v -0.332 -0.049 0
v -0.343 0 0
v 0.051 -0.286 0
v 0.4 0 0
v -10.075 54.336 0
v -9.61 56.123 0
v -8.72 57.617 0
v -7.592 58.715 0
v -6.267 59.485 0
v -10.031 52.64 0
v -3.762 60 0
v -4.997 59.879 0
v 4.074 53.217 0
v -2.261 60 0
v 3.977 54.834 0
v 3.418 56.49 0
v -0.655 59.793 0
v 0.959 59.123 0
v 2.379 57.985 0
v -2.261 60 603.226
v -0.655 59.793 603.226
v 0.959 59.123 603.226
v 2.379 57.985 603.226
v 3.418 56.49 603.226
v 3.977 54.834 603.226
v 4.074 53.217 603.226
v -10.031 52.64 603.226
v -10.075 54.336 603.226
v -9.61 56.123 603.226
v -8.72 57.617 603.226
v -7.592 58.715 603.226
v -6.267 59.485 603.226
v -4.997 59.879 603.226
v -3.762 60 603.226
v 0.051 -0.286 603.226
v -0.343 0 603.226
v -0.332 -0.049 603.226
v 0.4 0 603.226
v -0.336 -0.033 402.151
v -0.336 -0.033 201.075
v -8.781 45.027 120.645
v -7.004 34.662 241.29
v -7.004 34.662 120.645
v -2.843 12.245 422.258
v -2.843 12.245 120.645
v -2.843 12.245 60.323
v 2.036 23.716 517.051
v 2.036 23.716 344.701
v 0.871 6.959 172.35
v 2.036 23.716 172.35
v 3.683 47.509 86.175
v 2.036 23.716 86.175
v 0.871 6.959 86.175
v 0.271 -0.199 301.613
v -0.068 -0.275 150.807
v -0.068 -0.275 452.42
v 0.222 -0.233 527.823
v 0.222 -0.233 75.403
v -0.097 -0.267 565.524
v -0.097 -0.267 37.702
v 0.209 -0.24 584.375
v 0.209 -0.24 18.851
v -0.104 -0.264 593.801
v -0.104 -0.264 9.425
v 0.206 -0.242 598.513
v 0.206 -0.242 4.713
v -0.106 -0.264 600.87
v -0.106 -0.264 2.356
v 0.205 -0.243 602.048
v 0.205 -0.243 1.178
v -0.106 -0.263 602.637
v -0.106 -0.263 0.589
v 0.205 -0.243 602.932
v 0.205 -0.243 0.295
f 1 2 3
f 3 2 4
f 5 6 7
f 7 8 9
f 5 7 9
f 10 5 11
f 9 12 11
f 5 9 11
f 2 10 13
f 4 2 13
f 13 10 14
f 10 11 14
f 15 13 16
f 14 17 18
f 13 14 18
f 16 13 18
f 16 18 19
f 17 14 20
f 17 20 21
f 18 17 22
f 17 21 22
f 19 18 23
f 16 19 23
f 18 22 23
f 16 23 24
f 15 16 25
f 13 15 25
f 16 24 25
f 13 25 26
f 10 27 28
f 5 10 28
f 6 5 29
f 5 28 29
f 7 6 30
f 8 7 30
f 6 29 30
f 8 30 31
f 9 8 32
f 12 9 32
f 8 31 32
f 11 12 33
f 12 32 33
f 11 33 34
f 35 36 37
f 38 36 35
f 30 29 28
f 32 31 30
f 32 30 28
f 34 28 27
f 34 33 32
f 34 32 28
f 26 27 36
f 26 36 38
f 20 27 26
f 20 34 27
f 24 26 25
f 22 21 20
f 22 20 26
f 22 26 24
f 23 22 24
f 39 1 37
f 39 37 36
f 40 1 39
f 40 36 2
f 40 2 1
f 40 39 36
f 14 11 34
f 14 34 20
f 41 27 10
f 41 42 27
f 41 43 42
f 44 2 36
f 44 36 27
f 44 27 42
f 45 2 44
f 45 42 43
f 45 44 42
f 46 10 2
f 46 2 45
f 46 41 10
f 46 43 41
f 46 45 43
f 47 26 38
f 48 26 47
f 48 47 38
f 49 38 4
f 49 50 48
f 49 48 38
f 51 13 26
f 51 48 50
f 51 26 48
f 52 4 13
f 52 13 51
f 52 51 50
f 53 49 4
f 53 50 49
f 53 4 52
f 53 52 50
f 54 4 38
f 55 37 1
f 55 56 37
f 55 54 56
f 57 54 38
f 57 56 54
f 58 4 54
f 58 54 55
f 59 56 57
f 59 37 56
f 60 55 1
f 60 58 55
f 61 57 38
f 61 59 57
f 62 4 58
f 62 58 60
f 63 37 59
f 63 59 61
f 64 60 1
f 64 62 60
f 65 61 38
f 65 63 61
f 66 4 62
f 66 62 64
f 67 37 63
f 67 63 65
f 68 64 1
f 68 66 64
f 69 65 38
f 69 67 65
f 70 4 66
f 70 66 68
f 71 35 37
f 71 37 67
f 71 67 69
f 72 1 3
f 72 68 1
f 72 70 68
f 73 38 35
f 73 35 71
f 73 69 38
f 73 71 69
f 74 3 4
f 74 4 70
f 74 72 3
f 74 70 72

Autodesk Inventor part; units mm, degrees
ref_plane "YZ Plane" through (0, 0, 0) normal (1, 0, 0) x (0, 1, 0)
ref_plane "XZ Plane" through (0, 0, 0) normal (0, 1, 0) x (-1, 0, 0)
ref_plane "Work Plane1" through (0, 0, 0) normal (0, 0, 1) x (1, 0, 0)
sketch "Sketch1" plane through (0, 0, 0) normal (0, 0, 1) x (1, 0, 0)
  spline S0 degree 3 poles (-0.3432, 0) (-0.5476, 0.9305) (-1.8109, 6.8833) (-4.6379, 21.5083) (-5.8348, 28.0065) (-7.2785, 36.223) (-7.5554, 37.8163) (-8.144, 41.2441) (-8.4751, 43.1968) (-9.6001, 49.9214) (-10.403, 54.896) (-11.194, 60) knots -7.723672 -7.723672 -7.723672 -7.723672 -4.852573 -4.852573 -2.692004 -2.692004 -2.185384 -2.185384 -1.605169 -1.605169 -0.053083 -0.053083 -0.053083 -0.053083 projected
  spline S1 degree 3 poles (-0.3324, -0.0487) (-0.3358, -0.0335) (-0.3394, -0.0172) (-0.3432, 0) knots -0.056243 -0.056243 -0.056243 -0.056243 -0.050014 -0.050014 -0.050014 -0.050014 projected
  spline S2 degree 3 poles (0.4003, 0) (0.3914, -0.0334) (0.3779, -0.0655) (0.3429, -0.1252) (0.3214, -0.1525) (0.2602, -0.2119) (0.2174, -0.2397) (0.1233, -0.2774) (0.0729, -0.2868) (-0.0285, -0.2859) (-0.0786, -0.2756) (-0.1717, -0.2365) (-0.214, -0.2081) (-0.285, -0.1369) (-0.3131, -0.0949) (-0.3324, -0.0487) knots -0.096513 -0.096513 -0.096513 -0.096513 -0.086135 -0.086135 -0.075744 -0.075744 -0.060566 -0.060566 -0.045346 -0.045346 -0.030151 -0.030151 -0.015033 -0.015033 0 0 0 0 projected
  spline S3 degree 3 poles (4.5352, 60) (4.1492, 54.3024) (3.8851, 50.4553) (3.5768, 45.9572) (3.4952, 44.7719) (3.3704, 42.9615) (3.3433, 42.5677) (2.8933, 36.0424) (2.4653, 29.8794) (1.9678, 22.7306) (1.9176, 22.0094) (1.5419, 16.6071) (1.2042, 11.7834) (0.7423, 5.1029) (0.4375, 0.6896) (0.4003, 0) knots -1.505674 -1.505674 -1.505674 -1.505674 -1.330011 -1.330011 -1.237485 -1.237485 -1.213768 -1.213768 -0.810155 -0.810155 -0.745592 -0.745592 -0.207193 -0.207193 0 0 0 0 projected
  line L0 (-11.194, 60) -> (4.5352, 60) projected
  point P0 (0, 0)
ref_plane "Work Plane2" through (-0.5511, 59.985, 603.2266) normal (-0.0007, 0, -1) x (-1, 0.0063, 0.0007)
sketch "Sketch2" plane through (-0.5511, 59.985, 603.2266) normal (-0.0007, 0, -1) x (-1, 0.0063, 0.0007)
  spline S0 degree 3 poles (10.5494, 0) (10.2293, -2.2481) (9.8995, -4.4964) (9.1887, -9.2246) (8.8031, -11.7217) (7.617, -19.2349) (6.7636, -24.413) (5.6798, -30.7739) (5.4357, -32.1924) (4.488, -37.646) (3.7345, -41.8662) (1.487, -53.9406) (0.6091, -57.9871) (0.1466, -60) knots -1.758139 -1.758139 -1.758139 -1.758139 -1.591949 -1.591949 -1.406575 -1.406575 -1.02993 -1.02993 -0.92277 -0.92277 -0.615604 -0.615604 -0.003901 -0.003901 -0.003901 -0.003901 projected
  line L0 (-4.5586, 0) -> (10.5494, 0) projected
  spline S1 degree 3 poles (-0.4384, -60) (-0.5115, -58.4166) (-0.6219, -56.3988) (-0.8889, -51.9428) (-1.0365, -49.6525) (-1.4591, -43.3117) (-1.7767, -38.8185) (-2.2573, -32.1106) (-2.4709, -29.16) (-2.7817, -24.8733) (-2.8913, -23.3626) (-3.3521, -17.0005) (-3.6389, -13.0261) (-3.987, -8.1315) (-4.0258, -7.5846) (-4.2301, -4.7006) (-4.3955, -2.346) (-4.5586, 0) knots -6.638256 -6.638256 -6.638256 -6.638256 -5.879486 -5.879486 -5.125599 -5.125599 -3.729436 -3.729436 -2.742881 -2.742881 -2.242014 -2.242014 -0.922307 -0.922307 -0.757416 -0.757416 -0.052368 -0.052368 -0.052368 -0.052368 projected
  spline S2 degree 3 poles (0.1378, -60.0383) (0.1276, -60.0613) (0.1145, -60.083) (0.0834, -60.1227) (0.0654, -60.1405) (0.0137, -60.1806) (-0.0226, -60.1987) (-0.1, -60.22) (-0.1405, -60.223) (-0.2203, -60.2134) (-0.2588, -60.2008) (-0.3286, -60.1618) (-0.3593, -60.1358) (-0.4088, -60.0736) (-0.4273, -60.0381) (-0.4384, -60) knots -0.075123 -0.075123 -0.075123 -0.075123 -0.067561 -0.067561 -0.059991 -0.059991 -0.047948 -0.047948 -0.035886 -0.035886 -0.023859 -0.023859 -0.011899 -0.011899 0 0 0 0 projected
  spline S3 degree 3 poles (0.1466, -60) (0.1437, -60.0128) (0.1407, -60.0255) (0.1378, -60.0383) knots -0.00392 -0.00392 -0.00392 -0.00392 0 0 0 0 projected
  point P0 (-1.322, -59.9791)
ref_plane "Work Plane3" through (0, 60, 0) normal (0, -1, 0) x (-1, 0, 0)
sketch "Sketch3" plane through (0, 60, 0) normal (0, -1, 0) x (-1, 0, 0)
  line L0 (-4.5585, -602.272) -> (10.5506, -602.272) projected
  spline S0 degree 3 poles (11.194, 0) (11.0061, -196.1225) (10.7842, -410.86) (10.5506, -602.272) knots -57.533814 -57.533814 -57.533814 -57.533814 -0.145819 -0.145819 -0.145819 -0.145819 projected
  line L1 (11.194, 0) -> (-4.5352, 0) projected
  spline S1 degree 3 poles (-4.5585, -602.272) (-4.5373, -395.7385) (-4.5305, -201.8279) (-4.5352, 0) knots -60.602558 -60.602558 -60.602558 -60.602558 -0.050245 -0.050245 -0.050245 -0.050245 projected
  point P0 (0, 0)
ref_plane "Work Plane4" through (0, 0, 0) normal (0, 0, 1) x (1, 0, 0)
sketch "Sketch4" plane through (0, 0, 0) normal (0, 0, 1) x (1, 0, 0)
  spline S0 degree 3 poles (-0.3432, 0) (-0.5476, 0.9305) (-1.8109, 6.8833) (-4.6379, 21.5083) (-5.8348, 28.0065) (-7.2785, 36.223) (-7.5554, 37.8163) (-8.144, 41.2441) (-8.4751, 43.1968) (-9.6001, 49.9214) (-10.403, 54.896) (-11.194, 60) knots -7.723672 -7.723672 -7.723672 -7.723672 -4.852573 -4.852573 -2.692004 -2.692004 -2.185384 -2.185384 -1.605169 -1.605169 -0.053083 -0.053083 -0.053083 -0.053083 projected
  spline S1 degree 3 poles (-0.3324, -0.0487) (-0.3358, -0.0335) (-0.3394, -0.0172) (-0.3432, 0) knots -0.056243 -0.056243 -0.056243 -0.056243 -0.050014 -0.050014 -0.050014 -0.050014 projected
  spline S2 degree 3 poles (0.4003, 0) (0.3914, -0.0334) (0.3779, -0.0655) (0.3429, -0.1252) (0.3214, -0.1525) (0.2602, -0.2119) (0.2174, -0.2397) (0.1233, -0.2774) (0.0729, -0.2868) (-0.0285, -0.2859) (-0.0786, -0.2756) (-0.1717, -0.2365) (-0.214, -0.2081) (-0.285, -0.1369) (-0.3131, -0.0949) (-0.3324, -0.0487) knots -0.096513 -0.096513 -0.096513 -0.096513 -0.086135 -0.086135 -0.075744 -0.075744 -0.060566 -0.060566 -0.045346 -0.045346 -0.030151 -0.030151 -0.015033 -0.015033 0 0 0 0 projected
  spline S3 degree 3 poles (4.5352, 60) (4.1492, 54.3024) (3.8851, 50.4553) (3.5768, 45.9572) (3.4952, 44.7719) (3.3704, 42.9615) (3.3433, 42.5677) (2.8933, 36.0424) (2.4653, 29.8794) (1.9678, 22.7306) (1.9176, 22.0094) (1.5419, 16.6071) (1.2042, 11.7834) (0.7423, 5.1029) (0.4375, 0.6896) (0.4003, 0) knots -1.505674 -1.505674 -1.505674 -1.505674 -1.330011 -1.330011 -1.237485 -1.237485 -1.213768 -1.213768 -0.810155 -0.810155 -0.745592 -0.745592 -0.207193 -0.207193 0 0 0 0 projected
  line L0 (-11.194, 60) -> (4.5352, 60) projected
  point P0 (0, 0)
ref_plane "Work Plane5" through (-11.4796, -0.2671, 603.2336) normal (-0.0007, 0, -1) x (0.0063, 1, 0)
extrude "Extrusion1" add sketch "Sketch4" along normal up to surface (603.2261 mm away)
fillet "Fillet1" radius 6.35 2 edges at (-11.194, 60, 301.6131) (4.5352, 60, 301.6131)
properties part number "Aleiron"
